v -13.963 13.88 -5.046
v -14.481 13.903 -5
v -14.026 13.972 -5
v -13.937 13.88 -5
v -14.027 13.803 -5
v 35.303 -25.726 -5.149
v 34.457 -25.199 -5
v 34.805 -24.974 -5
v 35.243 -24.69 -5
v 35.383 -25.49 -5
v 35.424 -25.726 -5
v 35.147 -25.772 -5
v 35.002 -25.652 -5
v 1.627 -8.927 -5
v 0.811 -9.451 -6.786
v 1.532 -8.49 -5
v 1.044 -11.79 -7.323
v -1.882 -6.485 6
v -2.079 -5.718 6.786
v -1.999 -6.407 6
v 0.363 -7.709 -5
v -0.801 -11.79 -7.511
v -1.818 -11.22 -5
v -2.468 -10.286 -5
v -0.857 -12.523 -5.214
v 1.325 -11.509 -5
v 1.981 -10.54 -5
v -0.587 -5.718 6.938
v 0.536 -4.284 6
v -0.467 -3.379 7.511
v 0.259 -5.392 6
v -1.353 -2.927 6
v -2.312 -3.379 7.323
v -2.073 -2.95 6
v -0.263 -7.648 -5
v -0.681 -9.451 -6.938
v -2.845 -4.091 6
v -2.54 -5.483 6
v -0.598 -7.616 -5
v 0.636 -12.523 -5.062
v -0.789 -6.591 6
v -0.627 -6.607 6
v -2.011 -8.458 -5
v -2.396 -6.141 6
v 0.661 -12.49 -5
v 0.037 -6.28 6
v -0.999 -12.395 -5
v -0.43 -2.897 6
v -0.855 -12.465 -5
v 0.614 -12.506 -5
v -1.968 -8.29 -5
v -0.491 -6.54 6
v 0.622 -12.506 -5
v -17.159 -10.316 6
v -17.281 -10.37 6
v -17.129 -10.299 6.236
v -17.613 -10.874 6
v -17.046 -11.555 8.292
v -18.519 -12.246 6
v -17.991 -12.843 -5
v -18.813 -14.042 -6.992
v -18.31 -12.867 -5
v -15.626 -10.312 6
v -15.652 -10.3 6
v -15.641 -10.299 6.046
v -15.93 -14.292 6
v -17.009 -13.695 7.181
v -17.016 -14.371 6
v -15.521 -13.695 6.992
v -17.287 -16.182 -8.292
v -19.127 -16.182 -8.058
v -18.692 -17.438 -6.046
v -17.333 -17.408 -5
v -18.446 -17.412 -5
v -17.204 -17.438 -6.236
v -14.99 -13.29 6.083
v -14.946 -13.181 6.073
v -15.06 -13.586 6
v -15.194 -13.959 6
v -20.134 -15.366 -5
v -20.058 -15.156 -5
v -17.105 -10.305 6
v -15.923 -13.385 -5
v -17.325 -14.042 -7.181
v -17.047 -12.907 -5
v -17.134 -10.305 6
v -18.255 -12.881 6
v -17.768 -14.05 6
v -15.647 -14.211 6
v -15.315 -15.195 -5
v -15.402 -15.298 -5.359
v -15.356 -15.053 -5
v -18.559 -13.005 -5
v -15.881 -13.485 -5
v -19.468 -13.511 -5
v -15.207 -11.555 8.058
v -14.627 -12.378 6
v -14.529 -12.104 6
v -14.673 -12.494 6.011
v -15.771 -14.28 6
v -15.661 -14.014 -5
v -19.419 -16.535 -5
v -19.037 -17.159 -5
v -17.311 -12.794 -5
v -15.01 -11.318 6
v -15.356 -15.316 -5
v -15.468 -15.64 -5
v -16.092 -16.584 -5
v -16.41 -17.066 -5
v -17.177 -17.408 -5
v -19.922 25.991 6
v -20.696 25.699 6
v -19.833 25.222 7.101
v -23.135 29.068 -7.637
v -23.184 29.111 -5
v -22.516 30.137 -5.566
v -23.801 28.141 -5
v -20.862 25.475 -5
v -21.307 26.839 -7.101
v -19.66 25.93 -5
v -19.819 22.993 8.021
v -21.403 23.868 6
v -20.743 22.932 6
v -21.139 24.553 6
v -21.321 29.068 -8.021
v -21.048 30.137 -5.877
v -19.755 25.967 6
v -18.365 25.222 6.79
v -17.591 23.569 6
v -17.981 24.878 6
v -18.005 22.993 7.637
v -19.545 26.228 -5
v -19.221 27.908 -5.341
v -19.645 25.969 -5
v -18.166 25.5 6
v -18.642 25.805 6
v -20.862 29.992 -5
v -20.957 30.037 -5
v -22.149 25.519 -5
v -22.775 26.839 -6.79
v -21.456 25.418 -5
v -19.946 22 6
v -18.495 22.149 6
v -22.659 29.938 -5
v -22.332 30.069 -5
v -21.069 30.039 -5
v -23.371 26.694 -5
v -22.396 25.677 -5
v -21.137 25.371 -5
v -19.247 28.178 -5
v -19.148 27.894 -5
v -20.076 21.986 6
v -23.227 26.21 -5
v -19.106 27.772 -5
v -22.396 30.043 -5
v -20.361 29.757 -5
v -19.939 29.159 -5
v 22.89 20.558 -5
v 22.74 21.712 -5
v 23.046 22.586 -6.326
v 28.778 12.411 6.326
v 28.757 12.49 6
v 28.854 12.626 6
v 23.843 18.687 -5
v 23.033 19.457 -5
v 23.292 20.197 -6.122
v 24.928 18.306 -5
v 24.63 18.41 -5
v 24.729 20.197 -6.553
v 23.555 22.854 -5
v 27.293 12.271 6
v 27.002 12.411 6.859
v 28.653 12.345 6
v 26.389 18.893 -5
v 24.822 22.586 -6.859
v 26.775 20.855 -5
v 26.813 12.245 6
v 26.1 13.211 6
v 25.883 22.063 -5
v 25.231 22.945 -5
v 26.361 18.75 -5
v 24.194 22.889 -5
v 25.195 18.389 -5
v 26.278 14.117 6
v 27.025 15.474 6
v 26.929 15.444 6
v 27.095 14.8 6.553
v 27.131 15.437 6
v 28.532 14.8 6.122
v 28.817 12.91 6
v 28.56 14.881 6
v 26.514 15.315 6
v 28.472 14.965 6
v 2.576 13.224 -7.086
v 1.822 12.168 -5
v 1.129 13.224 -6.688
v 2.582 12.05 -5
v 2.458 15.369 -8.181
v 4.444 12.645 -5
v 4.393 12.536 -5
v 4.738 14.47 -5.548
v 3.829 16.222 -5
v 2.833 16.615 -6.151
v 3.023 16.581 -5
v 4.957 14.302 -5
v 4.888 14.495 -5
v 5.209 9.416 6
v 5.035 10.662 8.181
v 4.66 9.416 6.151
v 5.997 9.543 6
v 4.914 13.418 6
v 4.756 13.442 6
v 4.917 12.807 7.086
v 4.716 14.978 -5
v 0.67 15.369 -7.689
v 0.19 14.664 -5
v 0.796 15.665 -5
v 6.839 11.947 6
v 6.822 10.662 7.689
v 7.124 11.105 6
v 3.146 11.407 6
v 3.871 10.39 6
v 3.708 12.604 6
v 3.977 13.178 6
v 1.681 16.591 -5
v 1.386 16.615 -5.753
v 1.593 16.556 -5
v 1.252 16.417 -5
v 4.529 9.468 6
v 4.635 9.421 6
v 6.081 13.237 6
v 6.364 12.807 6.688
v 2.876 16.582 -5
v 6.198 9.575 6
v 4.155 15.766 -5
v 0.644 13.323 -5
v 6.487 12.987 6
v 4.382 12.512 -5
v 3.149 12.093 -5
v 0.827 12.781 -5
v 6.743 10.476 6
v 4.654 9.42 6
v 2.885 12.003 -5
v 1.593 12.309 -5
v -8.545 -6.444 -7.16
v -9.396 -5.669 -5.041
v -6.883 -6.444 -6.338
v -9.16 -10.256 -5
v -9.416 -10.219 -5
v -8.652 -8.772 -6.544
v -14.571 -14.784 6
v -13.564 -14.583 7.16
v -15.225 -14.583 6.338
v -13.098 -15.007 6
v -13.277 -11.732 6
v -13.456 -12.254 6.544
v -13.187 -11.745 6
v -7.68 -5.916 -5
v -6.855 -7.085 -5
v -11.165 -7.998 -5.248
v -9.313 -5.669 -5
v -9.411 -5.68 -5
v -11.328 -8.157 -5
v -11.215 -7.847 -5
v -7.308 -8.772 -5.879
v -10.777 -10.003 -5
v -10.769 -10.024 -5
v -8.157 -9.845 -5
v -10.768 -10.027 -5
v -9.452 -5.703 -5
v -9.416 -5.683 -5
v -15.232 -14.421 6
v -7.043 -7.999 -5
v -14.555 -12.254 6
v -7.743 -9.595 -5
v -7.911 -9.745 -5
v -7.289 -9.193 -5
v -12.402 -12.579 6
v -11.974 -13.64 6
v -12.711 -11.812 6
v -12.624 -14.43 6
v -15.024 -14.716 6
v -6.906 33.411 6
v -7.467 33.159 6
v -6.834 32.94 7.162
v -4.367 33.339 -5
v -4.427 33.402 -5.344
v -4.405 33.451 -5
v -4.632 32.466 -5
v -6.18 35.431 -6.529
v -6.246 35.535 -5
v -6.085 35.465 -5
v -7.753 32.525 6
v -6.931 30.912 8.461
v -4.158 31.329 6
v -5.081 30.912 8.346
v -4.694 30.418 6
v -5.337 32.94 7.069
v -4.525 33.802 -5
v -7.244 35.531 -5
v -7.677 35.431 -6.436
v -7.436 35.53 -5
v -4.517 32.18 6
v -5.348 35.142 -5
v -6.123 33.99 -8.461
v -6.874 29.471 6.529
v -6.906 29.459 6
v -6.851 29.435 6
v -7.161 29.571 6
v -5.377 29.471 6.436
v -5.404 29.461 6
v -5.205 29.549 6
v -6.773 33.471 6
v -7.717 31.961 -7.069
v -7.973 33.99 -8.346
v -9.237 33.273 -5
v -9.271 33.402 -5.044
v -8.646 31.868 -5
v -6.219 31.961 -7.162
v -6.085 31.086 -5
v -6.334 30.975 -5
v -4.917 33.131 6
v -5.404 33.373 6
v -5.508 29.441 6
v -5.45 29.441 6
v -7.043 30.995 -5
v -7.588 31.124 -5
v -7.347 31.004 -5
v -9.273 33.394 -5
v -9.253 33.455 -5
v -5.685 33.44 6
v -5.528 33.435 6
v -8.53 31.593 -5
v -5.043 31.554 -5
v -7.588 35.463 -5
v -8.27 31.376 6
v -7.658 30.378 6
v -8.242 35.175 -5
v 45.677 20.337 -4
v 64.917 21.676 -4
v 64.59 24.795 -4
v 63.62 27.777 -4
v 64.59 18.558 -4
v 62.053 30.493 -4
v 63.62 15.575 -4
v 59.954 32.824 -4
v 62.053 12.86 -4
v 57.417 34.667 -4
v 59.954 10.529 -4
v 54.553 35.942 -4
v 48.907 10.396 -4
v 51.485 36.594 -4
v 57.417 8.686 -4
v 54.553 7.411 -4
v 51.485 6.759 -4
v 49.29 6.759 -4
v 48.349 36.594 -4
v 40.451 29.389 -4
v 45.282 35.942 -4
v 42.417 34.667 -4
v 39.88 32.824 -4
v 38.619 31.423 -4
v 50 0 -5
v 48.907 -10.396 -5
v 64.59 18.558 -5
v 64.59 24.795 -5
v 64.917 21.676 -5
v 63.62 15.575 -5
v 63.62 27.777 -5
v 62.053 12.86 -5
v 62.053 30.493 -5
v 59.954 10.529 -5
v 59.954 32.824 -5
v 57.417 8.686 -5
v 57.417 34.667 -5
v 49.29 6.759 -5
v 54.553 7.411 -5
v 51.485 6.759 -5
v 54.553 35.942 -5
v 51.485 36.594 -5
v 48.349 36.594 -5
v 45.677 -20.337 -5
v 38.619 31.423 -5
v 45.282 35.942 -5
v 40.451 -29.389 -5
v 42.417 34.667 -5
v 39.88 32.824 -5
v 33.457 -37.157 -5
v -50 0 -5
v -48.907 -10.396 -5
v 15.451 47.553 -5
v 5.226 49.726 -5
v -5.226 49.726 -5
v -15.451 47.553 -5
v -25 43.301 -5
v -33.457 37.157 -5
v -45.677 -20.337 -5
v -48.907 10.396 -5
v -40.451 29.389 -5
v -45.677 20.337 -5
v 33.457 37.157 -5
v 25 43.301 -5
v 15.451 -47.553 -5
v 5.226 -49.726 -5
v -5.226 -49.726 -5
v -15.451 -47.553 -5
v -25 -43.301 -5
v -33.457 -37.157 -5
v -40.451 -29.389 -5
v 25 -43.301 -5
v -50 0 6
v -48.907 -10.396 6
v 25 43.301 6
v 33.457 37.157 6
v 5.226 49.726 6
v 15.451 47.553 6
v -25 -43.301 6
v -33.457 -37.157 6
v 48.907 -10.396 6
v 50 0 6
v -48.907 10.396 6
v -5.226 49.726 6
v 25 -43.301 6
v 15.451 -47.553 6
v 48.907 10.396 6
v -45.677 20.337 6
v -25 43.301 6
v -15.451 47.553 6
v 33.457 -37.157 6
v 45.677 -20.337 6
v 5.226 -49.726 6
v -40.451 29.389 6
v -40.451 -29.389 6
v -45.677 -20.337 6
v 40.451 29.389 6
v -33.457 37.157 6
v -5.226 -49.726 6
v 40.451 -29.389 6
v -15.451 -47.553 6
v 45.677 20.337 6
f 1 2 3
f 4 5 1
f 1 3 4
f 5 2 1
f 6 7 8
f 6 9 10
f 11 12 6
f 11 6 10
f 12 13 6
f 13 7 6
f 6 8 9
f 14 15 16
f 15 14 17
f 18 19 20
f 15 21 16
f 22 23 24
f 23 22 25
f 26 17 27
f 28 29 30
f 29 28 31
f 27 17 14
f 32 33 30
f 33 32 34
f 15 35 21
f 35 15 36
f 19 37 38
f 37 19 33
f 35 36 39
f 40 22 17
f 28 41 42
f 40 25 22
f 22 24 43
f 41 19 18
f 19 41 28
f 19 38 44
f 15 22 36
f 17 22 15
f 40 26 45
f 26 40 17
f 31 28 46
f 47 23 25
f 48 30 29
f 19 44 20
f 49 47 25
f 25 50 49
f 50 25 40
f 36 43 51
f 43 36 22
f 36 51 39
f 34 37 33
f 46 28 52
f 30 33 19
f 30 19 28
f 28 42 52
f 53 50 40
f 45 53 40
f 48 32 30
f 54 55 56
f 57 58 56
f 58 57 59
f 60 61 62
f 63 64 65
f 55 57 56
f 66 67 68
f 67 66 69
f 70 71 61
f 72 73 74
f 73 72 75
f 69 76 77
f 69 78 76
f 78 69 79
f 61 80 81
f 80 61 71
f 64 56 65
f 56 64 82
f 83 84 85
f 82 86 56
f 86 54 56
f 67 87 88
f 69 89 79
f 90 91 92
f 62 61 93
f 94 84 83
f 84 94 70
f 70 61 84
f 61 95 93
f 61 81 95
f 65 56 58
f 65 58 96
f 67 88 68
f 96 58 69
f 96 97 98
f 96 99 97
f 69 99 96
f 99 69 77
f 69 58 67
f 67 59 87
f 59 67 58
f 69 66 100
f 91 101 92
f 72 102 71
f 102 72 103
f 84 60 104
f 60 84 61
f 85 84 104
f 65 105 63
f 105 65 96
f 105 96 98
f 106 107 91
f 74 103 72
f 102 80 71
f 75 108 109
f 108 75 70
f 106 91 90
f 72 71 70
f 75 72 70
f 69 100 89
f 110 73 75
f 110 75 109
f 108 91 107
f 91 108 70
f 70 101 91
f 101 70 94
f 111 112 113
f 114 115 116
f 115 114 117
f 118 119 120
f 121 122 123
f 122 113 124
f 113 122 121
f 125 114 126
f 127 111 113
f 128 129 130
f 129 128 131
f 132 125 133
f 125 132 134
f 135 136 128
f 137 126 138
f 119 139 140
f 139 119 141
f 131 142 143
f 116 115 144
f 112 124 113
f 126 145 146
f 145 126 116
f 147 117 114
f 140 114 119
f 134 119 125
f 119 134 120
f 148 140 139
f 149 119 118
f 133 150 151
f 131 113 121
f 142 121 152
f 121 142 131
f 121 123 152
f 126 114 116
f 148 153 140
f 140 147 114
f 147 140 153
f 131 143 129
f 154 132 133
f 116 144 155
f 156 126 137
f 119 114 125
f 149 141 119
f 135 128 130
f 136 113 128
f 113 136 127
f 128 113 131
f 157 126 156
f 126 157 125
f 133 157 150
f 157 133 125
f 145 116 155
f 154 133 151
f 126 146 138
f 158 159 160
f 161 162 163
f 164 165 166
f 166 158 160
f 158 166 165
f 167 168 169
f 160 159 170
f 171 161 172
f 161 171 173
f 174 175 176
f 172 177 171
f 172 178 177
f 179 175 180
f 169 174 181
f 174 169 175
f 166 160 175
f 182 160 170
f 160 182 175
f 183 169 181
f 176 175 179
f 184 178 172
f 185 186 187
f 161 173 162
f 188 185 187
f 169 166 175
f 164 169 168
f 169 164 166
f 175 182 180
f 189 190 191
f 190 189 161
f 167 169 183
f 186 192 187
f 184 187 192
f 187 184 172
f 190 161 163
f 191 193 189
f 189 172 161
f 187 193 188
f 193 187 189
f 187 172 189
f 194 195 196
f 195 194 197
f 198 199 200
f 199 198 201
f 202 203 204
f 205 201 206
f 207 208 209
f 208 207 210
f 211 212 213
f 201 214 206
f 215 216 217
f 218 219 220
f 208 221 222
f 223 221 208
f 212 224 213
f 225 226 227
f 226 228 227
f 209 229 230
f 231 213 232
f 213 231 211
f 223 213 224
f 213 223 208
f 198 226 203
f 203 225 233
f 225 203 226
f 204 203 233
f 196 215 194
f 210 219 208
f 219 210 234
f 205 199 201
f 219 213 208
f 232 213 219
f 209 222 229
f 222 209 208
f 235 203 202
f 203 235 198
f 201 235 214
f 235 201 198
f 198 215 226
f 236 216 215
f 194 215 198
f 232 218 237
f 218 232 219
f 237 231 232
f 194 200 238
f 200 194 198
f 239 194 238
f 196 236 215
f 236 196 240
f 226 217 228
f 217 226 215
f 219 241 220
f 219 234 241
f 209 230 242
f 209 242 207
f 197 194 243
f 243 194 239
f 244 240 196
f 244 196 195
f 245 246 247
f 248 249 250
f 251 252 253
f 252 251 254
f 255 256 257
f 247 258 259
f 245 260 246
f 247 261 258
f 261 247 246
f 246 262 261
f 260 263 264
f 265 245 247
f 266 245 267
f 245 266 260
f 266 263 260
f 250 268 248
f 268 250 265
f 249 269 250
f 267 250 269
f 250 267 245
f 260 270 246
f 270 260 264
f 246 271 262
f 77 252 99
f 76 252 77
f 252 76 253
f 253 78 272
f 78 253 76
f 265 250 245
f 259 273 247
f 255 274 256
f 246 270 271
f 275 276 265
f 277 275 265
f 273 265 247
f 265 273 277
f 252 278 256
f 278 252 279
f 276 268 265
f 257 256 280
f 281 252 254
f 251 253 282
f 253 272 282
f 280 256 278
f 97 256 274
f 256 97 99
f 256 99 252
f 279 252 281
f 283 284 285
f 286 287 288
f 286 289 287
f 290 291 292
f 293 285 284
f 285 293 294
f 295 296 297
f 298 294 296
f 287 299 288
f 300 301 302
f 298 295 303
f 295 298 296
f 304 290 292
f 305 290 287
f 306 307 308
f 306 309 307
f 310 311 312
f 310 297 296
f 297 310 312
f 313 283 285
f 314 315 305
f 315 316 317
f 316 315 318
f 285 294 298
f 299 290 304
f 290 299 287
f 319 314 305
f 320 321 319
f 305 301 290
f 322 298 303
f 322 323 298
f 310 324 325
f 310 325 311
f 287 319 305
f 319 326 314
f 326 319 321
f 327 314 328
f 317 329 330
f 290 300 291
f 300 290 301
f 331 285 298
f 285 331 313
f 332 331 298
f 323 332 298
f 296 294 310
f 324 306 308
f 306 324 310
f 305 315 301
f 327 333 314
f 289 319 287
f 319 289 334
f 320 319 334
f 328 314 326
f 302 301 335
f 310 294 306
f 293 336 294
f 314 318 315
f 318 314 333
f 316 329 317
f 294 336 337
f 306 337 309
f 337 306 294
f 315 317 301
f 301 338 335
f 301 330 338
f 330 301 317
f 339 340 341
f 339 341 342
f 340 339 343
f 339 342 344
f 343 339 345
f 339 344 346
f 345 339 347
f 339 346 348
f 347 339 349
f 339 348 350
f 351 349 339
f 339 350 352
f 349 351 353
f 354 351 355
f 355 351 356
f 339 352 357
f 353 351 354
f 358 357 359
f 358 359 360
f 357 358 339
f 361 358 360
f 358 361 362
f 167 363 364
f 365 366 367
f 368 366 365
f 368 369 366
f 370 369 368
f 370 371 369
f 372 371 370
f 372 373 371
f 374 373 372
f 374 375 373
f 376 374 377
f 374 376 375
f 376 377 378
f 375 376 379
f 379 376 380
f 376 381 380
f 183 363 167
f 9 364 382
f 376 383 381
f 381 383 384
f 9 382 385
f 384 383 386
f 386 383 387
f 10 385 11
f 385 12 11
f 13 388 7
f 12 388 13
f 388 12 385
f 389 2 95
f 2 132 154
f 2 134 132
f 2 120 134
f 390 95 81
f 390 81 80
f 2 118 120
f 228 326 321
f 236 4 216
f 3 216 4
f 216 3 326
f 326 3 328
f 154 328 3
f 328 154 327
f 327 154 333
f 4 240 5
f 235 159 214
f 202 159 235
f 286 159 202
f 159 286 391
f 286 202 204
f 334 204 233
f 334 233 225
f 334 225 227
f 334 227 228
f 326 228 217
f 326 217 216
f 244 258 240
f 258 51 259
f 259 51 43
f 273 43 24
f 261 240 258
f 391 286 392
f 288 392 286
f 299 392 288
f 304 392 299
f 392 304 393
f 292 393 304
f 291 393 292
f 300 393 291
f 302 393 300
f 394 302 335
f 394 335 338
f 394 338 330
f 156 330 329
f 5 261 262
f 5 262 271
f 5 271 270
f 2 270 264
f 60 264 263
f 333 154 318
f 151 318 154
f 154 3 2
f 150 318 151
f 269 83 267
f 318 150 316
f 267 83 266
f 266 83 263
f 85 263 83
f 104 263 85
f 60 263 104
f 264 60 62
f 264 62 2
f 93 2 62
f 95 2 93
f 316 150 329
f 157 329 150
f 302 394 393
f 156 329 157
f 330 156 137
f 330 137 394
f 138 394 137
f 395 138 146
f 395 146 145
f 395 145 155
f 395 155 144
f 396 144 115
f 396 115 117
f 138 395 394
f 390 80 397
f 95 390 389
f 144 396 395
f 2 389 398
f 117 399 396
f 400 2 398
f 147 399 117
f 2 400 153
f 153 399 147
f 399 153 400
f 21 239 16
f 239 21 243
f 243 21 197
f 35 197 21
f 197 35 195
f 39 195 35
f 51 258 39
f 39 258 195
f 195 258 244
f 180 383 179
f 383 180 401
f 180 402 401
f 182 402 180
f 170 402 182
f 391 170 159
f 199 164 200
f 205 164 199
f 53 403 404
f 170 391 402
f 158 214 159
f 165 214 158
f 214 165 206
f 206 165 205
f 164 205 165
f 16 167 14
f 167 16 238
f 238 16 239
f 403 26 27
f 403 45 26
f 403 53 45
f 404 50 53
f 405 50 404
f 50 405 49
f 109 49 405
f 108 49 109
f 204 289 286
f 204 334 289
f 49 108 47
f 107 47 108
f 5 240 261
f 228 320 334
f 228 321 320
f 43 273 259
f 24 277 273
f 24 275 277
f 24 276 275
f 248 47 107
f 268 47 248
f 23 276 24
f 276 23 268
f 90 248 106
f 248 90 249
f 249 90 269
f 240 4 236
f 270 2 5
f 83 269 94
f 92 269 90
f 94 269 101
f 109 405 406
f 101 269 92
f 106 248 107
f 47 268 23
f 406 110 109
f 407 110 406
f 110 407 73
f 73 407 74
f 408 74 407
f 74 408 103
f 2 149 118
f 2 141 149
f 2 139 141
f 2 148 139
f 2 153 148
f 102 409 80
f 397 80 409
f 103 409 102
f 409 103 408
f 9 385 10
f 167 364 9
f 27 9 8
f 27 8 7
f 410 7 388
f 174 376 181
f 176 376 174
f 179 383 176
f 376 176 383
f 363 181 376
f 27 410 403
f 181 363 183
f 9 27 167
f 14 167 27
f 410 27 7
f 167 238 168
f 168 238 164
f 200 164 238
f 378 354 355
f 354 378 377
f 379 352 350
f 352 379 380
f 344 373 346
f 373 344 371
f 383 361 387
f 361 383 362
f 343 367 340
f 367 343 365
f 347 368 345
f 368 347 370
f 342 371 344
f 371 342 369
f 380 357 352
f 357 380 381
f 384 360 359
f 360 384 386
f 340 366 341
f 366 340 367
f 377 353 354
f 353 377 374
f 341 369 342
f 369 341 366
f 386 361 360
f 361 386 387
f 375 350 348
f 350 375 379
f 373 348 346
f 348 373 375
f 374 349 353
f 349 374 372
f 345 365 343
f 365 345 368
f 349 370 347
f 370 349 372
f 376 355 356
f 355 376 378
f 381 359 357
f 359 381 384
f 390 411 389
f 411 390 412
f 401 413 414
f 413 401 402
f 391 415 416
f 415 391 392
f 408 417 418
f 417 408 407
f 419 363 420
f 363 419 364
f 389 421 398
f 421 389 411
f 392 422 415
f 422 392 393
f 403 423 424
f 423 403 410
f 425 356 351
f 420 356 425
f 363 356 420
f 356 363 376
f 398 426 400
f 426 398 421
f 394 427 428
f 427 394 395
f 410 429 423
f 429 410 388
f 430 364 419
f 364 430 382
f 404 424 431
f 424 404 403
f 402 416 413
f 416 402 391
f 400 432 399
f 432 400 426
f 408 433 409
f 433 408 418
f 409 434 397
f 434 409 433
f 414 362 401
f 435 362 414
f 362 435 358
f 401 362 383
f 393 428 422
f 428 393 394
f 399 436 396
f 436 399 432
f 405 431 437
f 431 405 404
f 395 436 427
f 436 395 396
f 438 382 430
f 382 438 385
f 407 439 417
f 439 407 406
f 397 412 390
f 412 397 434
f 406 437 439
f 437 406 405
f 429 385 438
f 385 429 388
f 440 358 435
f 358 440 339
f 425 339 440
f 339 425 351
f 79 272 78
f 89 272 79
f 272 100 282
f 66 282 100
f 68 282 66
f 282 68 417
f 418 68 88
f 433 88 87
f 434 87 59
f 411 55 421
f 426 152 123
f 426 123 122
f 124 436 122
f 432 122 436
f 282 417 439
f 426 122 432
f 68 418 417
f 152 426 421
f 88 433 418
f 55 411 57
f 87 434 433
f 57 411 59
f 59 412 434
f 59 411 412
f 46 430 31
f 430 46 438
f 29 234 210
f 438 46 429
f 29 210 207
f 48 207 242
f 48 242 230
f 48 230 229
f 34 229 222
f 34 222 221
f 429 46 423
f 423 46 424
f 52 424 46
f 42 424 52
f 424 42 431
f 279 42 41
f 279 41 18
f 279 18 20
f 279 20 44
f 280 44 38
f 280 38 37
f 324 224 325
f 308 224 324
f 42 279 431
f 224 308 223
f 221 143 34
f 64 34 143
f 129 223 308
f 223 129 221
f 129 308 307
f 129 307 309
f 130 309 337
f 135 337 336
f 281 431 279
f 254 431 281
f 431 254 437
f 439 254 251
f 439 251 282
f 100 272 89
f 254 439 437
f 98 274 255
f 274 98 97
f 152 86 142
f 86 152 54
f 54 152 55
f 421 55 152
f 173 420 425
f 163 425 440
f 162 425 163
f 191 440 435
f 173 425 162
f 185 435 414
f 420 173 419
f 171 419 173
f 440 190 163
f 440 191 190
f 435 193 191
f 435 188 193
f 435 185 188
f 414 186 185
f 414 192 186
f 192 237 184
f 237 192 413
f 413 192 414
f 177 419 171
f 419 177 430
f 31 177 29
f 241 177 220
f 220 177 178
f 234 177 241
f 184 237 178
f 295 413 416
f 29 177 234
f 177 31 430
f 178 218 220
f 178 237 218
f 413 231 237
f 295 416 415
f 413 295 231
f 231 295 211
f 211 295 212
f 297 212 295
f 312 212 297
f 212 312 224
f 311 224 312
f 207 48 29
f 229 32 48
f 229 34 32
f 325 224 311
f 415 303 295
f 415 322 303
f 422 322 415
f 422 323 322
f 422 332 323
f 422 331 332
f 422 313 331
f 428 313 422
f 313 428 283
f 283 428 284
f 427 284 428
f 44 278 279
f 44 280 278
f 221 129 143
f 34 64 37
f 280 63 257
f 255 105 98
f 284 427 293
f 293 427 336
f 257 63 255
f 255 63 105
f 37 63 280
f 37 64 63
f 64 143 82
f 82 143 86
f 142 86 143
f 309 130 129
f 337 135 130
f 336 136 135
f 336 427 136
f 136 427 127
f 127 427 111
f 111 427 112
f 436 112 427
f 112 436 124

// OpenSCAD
width = 100;
thickness = 10;

module skin(width = 100, thickness = 10, spots){
    color("#7f4f1f")
    cylinder(h = 1, d = width);
    
    if(spots){
        for([0 : 3]){
            color("#222222")
            translate(rands(-50, 50, 2)) cylinder(h = 1, d = 30);
        }
    }
    
    color("#7f4f1f")
    translate([0, 0, thickness]) cylinder(h = 1, d = width);
    
}



module bean(radius = 3){
    color("#222222")
    scale([1, 3, 1]) sphere(radius);
    
}


module cheese(width = 100, thickness = 10){
    color("yellow", 0.3)
    translate([0, 0, 1]) cylinder(h = thickness - 1, d = width);
    
}

module mold(width, thickness){
    difference(){
        cube(10000000000)
        union(){
            skin(width, thickness, False);
            cheese(width, thickness);
        };
    };
};

module casadia(width = 100, thickness = 10){

    for([0 : 20]){
        translate(rands(-37, 37, 2)) rotate(rands(-180, 180, 2)) bean();
    }
    
    translate([0, 0, 0 - thickness/2]){
    skin(width, thickness, spots = 1);

    cheese(width, thickness);
    }

}

casadia();
